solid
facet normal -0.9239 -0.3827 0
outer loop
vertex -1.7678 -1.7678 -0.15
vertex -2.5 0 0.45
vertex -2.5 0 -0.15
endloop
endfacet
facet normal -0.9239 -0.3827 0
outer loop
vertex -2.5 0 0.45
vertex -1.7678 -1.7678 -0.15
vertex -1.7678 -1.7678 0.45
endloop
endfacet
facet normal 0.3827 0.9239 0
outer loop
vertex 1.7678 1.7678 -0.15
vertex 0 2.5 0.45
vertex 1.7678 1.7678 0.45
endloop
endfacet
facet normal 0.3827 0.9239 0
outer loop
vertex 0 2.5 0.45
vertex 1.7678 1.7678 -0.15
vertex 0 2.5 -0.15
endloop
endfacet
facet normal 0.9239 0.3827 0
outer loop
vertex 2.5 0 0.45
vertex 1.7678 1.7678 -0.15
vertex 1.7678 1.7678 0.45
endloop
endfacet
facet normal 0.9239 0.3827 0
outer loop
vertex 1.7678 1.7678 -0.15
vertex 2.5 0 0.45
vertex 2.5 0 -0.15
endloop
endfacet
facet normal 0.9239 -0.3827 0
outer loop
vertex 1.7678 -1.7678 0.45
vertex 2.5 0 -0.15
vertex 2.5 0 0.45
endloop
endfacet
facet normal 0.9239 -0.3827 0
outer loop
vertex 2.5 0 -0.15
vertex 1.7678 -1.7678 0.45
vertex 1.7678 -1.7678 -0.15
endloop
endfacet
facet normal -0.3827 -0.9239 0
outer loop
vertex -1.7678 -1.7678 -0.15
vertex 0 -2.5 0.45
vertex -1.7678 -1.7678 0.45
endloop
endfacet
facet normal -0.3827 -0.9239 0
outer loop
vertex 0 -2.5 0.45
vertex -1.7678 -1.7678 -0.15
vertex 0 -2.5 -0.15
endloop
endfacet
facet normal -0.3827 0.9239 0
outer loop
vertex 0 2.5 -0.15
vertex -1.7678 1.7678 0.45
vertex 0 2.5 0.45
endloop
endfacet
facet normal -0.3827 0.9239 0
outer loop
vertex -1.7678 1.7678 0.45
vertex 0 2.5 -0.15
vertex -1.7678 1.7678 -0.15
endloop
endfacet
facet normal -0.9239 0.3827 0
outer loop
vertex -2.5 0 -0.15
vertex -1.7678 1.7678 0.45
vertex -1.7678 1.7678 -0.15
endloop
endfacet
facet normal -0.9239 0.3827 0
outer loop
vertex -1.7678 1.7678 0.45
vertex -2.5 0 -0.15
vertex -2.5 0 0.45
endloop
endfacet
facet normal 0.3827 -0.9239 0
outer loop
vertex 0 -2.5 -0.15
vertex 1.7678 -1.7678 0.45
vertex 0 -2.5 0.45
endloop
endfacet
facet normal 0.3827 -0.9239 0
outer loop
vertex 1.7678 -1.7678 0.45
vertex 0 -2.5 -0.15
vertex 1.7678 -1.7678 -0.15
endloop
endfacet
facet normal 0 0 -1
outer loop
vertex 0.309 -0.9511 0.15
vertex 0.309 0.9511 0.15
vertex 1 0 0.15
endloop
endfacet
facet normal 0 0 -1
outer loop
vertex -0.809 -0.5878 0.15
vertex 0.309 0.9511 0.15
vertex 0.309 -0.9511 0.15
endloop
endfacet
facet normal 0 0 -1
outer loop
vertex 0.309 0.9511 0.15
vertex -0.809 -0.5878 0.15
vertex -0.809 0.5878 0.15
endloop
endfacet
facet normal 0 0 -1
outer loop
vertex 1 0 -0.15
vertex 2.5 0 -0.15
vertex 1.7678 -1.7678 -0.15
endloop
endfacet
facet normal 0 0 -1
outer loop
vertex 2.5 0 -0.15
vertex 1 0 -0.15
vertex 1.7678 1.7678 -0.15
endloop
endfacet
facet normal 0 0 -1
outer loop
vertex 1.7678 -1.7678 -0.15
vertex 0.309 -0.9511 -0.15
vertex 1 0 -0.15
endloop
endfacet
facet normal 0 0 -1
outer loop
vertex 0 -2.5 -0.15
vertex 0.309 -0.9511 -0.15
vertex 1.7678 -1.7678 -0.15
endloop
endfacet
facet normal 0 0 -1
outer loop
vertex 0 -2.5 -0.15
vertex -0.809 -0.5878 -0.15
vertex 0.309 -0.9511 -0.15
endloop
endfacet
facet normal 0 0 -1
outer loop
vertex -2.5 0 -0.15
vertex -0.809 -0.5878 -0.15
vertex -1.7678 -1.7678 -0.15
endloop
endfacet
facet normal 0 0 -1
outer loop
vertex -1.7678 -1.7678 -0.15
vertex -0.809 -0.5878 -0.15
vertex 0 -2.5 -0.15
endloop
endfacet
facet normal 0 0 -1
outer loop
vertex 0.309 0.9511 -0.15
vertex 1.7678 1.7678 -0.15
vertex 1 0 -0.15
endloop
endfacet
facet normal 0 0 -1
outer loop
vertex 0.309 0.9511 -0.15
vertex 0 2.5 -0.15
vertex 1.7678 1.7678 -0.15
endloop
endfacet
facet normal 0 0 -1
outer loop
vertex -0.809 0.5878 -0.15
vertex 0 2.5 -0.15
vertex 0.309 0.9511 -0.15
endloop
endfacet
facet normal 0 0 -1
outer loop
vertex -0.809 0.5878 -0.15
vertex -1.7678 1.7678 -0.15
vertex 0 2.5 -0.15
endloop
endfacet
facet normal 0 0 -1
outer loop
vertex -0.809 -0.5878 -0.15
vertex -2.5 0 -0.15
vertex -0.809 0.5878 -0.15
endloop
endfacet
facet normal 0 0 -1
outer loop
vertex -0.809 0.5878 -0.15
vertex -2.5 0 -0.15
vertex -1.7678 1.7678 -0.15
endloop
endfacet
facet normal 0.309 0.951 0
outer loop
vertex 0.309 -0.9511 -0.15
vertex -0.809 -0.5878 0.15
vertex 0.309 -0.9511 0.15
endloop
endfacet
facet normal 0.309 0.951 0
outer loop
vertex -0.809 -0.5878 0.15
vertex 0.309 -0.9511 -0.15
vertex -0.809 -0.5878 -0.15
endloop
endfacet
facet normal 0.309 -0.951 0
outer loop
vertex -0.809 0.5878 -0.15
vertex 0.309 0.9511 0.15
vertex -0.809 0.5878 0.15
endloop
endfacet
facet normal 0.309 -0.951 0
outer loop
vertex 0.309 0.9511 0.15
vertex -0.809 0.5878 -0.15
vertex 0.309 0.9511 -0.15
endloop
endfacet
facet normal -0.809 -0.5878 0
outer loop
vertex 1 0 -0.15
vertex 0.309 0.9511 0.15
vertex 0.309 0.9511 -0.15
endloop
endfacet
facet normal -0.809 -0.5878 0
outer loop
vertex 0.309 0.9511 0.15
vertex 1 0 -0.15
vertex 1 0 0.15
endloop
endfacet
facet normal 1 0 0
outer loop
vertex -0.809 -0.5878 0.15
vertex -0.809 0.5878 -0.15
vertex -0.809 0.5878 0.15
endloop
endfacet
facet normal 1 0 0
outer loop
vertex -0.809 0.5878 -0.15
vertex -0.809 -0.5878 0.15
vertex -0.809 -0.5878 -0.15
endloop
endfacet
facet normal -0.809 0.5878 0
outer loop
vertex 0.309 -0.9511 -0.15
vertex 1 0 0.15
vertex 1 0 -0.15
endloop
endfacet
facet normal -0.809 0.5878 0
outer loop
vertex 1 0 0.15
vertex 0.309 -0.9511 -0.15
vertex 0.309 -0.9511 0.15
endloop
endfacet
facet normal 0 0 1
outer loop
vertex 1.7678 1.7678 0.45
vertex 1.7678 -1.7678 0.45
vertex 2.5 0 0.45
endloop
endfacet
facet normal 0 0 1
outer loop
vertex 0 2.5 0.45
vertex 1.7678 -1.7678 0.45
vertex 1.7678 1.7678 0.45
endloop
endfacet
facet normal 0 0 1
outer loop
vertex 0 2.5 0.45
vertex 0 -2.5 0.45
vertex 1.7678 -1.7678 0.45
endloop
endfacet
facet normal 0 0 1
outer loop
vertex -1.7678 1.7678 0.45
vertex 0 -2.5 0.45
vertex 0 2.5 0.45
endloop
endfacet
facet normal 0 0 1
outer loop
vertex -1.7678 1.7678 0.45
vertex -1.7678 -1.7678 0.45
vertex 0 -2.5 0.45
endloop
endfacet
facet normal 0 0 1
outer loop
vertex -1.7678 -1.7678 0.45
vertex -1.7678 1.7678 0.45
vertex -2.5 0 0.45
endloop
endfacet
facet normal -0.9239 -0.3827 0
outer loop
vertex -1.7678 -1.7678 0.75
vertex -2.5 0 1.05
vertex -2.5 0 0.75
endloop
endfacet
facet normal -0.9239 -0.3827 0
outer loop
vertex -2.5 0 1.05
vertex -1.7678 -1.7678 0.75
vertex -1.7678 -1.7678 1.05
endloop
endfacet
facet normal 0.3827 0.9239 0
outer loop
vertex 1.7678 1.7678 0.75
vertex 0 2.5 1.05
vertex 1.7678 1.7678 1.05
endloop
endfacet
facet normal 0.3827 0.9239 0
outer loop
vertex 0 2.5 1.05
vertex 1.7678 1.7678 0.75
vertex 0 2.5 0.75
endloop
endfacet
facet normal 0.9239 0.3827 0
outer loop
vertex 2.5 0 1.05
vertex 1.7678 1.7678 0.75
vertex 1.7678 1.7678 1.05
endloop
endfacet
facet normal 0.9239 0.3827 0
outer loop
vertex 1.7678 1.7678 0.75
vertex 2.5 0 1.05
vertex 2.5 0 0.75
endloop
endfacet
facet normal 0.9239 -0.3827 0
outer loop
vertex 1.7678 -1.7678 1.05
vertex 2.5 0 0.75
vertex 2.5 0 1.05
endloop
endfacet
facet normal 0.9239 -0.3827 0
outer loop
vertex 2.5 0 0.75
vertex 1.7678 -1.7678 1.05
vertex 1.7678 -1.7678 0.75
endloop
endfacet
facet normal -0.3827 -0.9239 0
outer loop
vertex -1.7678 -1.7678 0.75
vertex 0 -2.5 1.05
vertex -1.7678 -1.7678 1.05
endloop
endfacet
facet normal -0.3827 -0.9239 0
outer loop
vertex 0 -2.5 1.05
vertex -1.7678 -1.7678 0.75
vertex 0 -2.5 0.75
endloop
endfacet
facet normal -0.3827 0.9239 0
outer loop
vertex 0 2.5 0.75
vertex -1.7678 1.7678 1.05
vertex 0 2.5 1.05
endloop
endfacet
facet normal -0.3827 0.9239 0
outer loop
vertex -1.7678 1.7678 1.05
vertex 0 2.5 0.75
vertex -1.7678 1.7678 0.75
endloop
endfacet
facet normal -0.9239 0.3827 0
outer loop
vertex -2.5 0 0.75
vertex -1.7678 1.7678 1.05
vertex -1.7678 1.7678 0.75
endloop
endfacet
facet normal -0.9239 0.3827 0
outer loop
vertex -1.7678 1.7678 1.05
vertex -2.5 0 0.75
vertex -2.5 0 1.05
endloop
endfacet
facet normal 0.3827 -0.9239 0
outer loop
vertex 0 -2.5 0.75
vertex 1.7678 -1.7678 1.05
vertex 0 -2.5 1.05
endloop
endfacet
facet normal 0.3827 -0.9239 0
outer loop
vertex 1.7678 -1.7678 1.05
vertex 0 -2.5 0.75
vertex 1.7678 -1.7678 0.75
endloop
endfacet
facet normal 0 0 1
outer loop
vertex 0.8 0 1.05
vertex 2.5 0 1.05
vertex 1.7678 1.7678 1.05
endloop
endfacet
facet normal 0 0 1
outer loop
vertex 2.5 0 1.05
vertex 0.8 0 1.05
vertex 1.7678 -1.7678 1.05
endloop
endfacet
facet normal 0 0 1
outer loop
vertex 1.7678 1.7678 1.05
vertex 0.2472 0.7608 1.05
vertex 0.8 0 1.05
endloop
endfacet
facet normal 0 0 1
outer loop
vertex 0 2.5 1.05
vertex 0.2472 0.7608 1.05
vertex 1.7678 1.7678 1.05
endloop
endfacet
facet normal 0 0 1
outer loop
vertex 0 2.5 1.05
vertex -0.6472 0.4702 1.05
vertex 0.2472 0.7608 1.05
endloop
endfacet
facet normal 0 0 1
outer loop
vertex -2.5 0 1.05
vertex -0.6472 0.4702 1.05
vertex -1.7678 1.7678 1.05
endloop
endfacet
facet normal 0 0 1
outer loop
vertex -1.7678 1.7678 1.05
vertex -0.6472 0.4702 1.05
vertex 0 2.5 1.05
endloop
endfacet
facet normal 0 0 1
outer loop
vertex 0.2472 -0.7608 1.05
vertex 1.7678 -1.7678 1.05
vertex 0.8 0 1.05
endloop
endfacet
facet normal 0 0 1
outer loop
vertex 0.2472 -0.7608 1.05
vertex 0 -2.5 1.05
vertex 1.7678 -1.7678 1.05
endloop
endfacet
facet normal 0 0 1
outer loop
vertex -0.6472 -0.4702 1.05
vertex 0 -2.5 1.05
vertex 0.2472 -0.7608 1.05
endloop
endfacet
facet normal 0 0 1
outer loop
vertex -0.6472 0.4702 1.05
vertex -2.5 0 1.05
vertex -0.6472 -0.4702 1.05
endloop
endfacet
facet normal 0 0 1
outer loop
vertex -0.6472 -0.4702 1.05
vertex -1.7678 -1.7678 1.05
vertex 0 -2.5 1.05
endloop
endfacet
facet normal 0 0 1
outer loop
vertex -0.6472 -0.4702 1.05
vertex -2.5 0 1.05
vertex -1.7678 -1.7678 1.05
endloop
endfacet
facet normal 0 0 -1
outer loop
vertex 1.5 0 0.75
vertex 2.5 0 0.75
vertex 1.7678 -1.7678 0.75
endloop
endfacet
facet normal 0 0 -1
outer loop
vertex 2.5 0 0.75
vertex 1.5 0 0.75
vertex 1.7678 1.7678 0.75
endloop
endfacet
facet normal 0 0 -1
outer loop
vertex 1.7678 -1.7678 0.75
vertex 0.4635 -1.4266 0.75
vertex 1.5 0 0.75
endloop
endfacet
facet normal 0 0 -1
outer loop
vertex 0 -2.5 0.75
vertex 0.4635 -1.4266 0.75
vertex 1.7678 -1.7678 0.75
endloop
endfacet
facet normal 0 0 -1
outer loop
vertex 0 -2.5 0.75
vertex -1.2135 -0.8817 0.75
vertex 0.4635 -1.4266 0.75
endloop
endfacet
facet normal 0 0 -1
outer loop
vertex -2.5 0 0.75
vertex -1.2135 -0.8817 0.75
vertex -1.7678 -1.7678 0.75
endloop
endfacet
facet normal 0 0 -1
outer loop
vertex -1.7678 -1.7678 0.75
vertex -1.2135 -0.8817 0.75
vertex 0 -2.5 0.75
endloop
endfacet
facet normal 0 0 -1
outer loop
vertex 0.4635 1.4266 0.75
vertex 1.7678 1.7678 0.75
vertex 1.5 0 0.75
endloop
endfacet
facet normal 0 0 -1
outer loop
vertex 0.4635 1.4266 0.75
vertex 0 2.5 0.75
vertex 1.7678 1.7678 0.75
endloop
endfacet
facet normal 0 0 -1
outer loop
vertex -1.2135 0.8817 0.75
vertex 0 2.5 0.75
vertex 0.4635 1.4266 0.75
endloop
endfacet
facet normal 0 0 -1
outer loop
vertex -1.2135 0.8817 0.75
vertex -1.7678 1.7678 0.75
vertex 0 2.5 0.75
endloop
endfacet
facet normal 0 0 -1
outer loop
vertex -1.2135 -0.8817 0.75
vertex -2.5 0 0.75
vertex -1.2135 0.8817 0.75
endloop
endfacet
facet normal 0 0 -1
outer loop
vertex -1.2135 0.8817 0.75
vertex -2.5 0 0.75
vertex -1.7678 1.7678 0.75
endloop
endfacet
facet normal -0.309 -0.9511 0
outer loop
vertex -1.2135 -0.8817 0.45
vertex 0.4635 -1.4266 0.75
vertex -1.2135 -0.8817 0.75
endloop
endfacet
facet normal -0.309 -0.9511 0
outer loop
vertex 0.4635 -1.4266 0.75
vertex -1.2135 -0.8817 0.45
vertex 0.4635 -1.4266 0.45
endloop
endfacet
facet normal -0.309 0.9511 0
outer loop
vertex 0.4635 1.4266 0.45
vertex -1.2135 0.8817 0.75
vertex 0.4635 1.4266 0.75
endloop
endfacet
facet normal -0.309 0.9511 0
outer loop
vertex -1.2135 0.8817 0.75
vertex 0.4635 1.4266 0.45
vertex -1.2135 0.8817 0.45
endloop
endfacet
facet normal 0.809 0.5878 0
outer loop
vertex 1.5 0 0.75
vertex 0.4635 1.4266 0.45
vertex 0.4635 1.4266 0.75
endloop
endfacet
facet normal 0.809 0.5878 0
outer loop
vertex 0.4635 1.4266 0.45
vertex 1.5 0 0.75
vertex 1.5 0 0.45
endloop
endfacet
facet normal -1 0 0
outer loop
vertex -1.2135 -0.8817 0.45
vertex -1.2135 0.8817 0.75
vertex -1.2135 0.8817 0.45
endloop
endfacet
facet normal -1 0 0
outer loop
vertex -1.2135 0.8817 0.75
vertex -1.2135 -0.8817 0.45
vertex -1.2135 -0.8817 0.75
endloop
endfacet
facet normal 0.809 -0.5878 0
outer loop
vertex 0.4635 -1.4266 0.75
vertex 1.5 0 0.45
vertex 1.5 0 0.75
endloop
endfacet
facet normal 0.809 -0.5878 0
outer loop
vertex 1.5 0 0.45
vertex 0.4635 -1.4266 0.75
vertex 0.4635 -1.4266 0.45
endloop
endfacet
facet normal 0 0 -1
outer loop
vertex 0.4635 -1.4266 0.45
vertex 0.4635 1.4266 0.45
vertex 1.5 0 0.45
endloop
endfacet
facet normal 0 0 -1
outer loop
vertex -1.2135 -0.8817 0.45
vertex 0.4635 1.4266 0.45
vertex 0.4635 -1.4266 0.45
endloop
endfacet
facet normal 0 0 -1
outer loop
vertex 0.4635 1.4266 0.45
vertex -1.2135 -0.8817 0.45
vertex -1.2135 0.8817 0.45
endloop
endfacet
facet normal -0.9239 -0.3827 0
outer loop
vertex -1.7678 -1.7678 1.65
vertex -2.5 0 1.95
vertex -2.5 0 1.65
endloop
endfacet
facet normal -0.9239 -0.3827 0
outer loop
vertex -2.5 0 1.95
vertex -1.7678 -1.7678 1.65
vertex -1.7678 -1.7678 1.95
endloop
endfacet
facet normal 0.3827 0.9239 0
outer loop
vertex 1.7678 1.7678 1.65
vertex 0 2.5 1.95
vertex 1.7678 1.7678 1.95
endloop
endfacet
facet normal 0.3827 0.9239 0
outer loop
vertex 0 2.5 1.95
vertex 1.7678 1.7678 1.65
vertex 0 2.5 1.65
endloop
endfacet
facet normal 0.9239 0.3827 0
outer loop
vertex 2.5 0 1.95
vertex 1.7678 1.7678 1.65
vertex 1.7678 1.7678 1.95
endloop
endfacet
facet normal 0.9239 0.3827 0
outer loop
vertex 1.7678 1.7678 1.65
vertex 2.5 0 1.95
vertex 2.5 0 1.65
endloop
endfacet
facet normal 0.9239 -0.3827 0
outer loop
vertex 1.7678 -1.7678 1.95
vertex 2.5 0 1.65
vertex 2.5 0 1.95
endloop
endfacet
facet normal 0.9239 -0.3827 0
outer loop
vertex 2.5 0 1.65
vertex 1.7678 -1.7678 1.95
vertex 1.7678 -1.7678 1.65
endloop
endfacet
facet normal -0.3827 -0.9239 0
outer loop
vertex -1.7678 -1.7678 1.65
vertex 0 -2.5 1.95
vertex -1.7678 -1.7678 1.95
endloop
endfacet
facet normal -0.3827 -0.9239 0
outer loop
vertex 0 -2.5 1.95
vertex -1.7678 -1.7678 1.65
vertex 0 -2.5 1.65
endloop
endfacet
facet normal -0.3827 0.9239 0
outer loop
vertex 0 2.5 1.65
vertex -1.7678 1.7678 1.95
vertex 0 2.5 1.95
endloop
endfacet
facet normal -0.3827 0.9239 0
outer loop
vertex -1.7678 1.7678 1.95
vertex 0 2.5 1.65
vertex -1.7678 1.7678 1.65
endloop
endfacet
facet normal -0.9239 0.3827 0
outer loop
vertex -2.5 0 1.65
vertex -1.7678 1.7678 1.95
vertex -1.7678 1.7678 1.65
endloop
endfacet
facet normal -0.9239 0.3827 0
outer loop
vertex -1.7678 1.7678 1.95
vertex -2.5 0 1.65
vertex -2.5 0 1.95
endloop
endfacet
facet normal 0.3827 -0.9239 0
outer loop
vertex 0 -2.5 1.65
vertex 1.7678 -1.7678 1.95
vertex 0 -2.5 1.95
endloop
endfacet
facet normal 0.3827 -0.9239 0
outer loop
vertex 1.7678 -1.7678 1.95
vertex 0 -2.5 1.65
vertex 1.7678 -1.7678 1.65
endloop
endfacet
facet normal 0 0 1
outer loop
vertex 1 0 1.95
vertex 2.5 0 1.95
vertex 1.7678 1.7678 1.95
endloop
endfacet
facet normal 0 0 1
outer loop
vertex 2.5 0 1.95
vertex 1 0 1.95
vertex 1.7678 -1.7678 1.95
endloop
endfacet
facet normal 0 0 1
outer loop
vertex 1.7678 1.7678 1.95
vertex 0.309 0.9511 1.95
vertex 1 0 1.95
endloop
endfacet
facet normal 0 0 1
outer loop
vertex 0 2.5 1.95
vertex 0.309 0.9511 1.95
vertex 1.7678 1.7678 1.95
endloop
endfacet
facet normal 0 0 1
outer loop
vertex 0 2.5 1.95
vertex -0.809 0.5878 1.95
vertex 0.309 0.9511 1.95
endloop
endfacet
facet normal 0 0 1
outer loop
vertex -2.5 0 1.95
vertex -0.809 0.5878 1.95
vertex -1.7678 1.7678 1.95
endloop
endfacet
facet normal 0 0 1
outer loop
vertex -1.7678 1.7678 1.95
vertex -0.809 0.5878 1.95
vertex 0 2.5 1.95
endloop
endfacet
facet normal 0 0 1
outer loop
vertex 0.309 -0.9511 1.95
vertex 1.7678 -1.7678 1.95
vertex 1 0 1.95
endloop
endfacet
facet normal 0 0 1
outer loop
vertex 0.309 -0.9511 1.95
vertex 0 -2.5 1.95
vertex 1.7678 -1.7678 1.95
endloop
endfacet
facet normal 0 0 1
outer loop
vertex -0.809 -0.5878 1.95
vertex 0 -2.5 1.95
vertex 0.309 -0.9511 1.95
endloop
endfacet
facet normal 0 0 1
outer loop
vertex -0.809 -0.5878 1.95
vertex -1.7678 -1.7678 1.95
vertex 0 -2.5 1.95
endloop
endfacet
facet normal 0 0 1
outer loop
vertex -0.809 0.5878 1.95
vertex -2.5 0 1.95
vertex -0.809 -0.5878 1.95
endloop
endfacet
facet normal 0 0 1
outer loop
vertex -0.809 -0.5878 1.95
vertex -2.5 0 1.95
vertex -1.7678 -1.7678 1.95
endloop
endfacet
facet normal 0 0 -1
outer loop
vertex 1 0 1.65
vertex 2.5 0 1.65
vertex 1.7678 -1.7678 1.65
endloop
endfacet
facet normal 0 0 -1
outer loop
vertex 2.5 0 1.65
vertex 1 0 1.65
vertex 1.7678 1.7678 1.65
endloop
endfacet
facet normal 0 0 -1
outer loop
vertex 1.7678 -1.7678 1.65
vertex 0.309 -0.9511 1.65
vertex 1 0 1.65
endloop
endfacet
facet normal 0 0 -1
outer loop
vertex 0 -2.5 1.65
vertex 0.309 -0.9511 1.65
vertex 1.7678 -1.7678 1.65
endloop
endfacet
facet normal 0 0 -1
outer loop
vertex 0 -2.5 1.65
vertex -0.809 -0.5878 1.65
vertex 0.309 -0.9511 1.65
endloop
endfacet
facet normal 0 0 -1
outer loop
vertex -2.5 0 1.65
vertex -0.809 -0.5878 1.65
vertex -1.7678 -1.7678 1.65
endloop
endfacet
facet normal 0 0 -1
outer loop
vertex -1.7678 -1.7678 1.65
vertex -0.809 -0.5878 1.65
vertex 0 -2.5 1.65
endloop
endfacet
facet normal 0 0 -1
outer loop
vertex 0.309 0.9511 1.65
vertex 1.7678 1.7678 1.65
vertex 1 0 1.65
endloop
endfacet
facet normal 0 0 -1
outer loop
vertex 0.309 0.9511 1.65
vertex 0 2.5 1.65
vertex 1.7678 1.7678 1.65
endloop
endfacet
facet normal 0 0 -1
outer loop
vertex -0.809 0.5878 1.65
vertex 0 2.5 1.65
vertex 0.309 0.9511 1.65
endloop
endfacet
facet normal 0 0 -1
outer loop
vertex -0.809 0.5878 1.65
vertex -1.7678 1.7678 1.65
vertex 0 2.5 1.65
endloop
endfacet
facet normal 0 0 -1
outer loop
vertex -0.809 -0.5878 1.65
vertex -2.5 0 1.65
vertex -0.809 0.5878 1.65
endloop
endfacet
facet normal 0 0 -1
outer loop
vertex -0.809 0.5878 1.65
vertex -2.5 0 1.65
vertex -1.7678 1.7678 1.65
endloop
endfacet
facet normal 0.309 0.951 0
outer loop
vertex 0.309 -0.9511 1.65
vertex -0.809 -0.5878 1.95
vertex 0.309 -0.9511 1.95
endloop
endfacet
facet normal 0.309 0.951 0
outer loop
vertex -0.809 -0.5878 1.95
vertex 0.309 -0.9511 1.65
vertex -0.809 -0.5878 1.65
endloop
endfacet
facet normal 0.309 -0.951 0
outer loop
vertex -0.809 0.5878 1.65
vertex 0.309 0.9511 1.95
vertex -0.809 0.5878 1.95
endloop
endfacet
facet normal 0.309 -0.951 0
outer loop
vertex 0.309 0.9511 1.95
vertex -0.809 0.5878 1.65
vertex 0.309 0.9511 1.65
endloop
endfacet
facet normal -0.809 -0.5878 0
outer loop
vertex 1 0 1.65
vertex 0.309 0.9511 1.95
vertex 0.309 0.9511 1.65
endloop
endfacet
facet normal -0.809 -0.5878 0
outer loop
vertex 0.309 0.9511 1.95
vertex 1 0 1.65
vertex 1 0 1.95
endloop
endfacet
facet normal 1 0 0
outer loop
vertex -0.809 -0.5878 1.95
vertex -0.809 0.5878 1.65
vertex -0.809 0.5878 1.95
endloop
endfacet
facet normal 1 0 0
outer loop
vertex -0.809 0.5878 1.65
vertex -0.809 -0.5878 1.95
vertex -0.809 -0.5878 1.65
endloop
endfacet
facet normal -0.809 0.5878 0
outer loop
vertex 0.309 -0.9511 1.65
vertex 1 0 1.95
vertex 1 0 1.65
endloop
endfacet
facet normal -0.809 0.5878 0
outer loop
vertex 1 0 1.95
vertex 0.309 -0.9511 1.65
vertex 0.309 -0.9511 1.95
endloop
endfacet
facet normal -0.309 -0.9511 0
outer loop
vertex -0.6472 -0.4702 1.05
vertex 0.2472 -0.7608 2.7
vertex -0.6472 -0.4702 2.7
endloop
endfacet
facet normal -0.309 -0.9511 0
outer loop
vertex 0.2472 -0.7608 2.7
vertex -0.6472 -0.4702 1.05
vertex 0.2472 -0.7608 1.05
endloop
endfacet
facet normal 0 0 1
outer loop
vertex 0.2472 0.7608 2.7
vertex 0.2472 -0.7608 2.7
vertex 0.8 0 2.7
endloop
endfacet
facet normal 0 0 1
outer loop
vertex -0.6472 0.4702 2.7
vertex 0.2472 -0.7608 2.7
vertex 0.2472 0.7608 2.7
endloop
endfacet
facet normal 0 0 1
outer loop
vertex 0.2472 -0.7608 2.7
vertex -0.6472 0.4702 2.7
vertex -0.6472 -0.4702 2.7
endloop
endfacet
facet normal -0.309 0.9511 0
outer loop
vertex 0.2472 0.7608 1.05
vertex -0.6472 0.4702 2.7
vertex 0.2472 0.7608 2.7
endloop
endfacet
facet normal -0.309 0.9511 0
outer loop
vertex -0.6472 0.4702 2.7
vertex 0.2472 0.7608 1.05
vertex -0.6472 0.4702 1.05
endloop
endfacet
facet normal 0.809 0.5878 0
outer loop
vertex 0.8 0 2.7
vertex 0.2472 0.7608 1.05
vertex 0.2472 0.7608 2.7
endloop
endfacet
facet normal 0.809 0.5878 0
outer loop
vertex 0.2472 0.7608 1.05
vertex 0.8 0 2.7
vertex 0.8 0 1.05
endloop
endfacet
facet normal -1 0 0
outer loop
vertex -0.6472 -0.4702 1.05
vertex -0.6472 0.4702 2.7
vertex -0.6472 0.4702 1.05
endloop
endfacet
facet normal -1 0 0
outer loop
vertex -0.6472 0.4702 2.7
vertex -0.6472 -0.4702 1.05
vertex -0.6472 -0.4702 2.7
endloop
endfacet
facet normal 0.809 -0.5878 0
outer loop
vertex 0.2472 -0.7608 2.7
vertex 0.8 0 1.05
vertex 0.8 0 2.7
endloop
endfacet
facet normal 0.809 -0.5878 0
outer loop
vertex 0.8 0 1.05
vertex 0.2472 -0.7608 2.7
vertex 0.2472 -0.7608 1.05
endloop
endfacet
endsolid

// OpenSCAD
// Parameters
inner_diameter_mm = 2.0; //[1.0:4.0:0.1]
outer_diameter_mm = 5.0; //[2.5:10.0:0.1]
thickness_mm = 0.3; //[0.15:0.6:0.05]
inner_radius_mm = 1.0; //[0.5:2.0:0.05]
outer_radius_mm = 2.5; //[1.25:5.0:0.05]
overlap_mm = 0.6; //[0.2:2.0:0.1]
hole_height_factor = 3.0; //[2.0:10.0:0.5]

// Washer Body
module washer_body() {
  difference() {
    cylinder(r=outer_radius_mm, h=thickness_mm, center=true);
    cylinder(r=inner_radius_mm, h=thickness_mm*hole_height_factor, center=true);
  }
}

// Round Grommet Top
module round_grommet_top() {
  color("Silver") {
    cylinder(r=outer_radius_mm, h=thickness_mm, center=true);
  }
}

// Round Grommet Assembly
module round_grommet_assembly() {
  union() {
    washer_body();
    translate([0, 0, thickness_mm]) round_grommet_top();
  }
}

// Nut and Washer
module nut_and_washer() {
  union() {
    washer_body();
    translate([0, 0, thickness_mm/2 + thickness_mm - overlap_mm]) 
      cylinder(r=outer_radius_mm*0.6, h=thickness_mm*2, center=true);
  }
}

// Screw and Washer
module screw_and_washer() {
  union() {
    washer_body();
    translate([0, 0, 0]) 
      cylinder(r=inner_radius_mm*0.8, h=thickness_mm*6, center=true);
  }
}

// Assembly
module assembly() {
  translate([0, 0, 0]) round_grommet_assembly();
  translate([0, 0, thickness_mm*3]) nut_and_washer();
  translate([0, 0, thickness_mm*6]) screw_and_washer();
}

assembly();
